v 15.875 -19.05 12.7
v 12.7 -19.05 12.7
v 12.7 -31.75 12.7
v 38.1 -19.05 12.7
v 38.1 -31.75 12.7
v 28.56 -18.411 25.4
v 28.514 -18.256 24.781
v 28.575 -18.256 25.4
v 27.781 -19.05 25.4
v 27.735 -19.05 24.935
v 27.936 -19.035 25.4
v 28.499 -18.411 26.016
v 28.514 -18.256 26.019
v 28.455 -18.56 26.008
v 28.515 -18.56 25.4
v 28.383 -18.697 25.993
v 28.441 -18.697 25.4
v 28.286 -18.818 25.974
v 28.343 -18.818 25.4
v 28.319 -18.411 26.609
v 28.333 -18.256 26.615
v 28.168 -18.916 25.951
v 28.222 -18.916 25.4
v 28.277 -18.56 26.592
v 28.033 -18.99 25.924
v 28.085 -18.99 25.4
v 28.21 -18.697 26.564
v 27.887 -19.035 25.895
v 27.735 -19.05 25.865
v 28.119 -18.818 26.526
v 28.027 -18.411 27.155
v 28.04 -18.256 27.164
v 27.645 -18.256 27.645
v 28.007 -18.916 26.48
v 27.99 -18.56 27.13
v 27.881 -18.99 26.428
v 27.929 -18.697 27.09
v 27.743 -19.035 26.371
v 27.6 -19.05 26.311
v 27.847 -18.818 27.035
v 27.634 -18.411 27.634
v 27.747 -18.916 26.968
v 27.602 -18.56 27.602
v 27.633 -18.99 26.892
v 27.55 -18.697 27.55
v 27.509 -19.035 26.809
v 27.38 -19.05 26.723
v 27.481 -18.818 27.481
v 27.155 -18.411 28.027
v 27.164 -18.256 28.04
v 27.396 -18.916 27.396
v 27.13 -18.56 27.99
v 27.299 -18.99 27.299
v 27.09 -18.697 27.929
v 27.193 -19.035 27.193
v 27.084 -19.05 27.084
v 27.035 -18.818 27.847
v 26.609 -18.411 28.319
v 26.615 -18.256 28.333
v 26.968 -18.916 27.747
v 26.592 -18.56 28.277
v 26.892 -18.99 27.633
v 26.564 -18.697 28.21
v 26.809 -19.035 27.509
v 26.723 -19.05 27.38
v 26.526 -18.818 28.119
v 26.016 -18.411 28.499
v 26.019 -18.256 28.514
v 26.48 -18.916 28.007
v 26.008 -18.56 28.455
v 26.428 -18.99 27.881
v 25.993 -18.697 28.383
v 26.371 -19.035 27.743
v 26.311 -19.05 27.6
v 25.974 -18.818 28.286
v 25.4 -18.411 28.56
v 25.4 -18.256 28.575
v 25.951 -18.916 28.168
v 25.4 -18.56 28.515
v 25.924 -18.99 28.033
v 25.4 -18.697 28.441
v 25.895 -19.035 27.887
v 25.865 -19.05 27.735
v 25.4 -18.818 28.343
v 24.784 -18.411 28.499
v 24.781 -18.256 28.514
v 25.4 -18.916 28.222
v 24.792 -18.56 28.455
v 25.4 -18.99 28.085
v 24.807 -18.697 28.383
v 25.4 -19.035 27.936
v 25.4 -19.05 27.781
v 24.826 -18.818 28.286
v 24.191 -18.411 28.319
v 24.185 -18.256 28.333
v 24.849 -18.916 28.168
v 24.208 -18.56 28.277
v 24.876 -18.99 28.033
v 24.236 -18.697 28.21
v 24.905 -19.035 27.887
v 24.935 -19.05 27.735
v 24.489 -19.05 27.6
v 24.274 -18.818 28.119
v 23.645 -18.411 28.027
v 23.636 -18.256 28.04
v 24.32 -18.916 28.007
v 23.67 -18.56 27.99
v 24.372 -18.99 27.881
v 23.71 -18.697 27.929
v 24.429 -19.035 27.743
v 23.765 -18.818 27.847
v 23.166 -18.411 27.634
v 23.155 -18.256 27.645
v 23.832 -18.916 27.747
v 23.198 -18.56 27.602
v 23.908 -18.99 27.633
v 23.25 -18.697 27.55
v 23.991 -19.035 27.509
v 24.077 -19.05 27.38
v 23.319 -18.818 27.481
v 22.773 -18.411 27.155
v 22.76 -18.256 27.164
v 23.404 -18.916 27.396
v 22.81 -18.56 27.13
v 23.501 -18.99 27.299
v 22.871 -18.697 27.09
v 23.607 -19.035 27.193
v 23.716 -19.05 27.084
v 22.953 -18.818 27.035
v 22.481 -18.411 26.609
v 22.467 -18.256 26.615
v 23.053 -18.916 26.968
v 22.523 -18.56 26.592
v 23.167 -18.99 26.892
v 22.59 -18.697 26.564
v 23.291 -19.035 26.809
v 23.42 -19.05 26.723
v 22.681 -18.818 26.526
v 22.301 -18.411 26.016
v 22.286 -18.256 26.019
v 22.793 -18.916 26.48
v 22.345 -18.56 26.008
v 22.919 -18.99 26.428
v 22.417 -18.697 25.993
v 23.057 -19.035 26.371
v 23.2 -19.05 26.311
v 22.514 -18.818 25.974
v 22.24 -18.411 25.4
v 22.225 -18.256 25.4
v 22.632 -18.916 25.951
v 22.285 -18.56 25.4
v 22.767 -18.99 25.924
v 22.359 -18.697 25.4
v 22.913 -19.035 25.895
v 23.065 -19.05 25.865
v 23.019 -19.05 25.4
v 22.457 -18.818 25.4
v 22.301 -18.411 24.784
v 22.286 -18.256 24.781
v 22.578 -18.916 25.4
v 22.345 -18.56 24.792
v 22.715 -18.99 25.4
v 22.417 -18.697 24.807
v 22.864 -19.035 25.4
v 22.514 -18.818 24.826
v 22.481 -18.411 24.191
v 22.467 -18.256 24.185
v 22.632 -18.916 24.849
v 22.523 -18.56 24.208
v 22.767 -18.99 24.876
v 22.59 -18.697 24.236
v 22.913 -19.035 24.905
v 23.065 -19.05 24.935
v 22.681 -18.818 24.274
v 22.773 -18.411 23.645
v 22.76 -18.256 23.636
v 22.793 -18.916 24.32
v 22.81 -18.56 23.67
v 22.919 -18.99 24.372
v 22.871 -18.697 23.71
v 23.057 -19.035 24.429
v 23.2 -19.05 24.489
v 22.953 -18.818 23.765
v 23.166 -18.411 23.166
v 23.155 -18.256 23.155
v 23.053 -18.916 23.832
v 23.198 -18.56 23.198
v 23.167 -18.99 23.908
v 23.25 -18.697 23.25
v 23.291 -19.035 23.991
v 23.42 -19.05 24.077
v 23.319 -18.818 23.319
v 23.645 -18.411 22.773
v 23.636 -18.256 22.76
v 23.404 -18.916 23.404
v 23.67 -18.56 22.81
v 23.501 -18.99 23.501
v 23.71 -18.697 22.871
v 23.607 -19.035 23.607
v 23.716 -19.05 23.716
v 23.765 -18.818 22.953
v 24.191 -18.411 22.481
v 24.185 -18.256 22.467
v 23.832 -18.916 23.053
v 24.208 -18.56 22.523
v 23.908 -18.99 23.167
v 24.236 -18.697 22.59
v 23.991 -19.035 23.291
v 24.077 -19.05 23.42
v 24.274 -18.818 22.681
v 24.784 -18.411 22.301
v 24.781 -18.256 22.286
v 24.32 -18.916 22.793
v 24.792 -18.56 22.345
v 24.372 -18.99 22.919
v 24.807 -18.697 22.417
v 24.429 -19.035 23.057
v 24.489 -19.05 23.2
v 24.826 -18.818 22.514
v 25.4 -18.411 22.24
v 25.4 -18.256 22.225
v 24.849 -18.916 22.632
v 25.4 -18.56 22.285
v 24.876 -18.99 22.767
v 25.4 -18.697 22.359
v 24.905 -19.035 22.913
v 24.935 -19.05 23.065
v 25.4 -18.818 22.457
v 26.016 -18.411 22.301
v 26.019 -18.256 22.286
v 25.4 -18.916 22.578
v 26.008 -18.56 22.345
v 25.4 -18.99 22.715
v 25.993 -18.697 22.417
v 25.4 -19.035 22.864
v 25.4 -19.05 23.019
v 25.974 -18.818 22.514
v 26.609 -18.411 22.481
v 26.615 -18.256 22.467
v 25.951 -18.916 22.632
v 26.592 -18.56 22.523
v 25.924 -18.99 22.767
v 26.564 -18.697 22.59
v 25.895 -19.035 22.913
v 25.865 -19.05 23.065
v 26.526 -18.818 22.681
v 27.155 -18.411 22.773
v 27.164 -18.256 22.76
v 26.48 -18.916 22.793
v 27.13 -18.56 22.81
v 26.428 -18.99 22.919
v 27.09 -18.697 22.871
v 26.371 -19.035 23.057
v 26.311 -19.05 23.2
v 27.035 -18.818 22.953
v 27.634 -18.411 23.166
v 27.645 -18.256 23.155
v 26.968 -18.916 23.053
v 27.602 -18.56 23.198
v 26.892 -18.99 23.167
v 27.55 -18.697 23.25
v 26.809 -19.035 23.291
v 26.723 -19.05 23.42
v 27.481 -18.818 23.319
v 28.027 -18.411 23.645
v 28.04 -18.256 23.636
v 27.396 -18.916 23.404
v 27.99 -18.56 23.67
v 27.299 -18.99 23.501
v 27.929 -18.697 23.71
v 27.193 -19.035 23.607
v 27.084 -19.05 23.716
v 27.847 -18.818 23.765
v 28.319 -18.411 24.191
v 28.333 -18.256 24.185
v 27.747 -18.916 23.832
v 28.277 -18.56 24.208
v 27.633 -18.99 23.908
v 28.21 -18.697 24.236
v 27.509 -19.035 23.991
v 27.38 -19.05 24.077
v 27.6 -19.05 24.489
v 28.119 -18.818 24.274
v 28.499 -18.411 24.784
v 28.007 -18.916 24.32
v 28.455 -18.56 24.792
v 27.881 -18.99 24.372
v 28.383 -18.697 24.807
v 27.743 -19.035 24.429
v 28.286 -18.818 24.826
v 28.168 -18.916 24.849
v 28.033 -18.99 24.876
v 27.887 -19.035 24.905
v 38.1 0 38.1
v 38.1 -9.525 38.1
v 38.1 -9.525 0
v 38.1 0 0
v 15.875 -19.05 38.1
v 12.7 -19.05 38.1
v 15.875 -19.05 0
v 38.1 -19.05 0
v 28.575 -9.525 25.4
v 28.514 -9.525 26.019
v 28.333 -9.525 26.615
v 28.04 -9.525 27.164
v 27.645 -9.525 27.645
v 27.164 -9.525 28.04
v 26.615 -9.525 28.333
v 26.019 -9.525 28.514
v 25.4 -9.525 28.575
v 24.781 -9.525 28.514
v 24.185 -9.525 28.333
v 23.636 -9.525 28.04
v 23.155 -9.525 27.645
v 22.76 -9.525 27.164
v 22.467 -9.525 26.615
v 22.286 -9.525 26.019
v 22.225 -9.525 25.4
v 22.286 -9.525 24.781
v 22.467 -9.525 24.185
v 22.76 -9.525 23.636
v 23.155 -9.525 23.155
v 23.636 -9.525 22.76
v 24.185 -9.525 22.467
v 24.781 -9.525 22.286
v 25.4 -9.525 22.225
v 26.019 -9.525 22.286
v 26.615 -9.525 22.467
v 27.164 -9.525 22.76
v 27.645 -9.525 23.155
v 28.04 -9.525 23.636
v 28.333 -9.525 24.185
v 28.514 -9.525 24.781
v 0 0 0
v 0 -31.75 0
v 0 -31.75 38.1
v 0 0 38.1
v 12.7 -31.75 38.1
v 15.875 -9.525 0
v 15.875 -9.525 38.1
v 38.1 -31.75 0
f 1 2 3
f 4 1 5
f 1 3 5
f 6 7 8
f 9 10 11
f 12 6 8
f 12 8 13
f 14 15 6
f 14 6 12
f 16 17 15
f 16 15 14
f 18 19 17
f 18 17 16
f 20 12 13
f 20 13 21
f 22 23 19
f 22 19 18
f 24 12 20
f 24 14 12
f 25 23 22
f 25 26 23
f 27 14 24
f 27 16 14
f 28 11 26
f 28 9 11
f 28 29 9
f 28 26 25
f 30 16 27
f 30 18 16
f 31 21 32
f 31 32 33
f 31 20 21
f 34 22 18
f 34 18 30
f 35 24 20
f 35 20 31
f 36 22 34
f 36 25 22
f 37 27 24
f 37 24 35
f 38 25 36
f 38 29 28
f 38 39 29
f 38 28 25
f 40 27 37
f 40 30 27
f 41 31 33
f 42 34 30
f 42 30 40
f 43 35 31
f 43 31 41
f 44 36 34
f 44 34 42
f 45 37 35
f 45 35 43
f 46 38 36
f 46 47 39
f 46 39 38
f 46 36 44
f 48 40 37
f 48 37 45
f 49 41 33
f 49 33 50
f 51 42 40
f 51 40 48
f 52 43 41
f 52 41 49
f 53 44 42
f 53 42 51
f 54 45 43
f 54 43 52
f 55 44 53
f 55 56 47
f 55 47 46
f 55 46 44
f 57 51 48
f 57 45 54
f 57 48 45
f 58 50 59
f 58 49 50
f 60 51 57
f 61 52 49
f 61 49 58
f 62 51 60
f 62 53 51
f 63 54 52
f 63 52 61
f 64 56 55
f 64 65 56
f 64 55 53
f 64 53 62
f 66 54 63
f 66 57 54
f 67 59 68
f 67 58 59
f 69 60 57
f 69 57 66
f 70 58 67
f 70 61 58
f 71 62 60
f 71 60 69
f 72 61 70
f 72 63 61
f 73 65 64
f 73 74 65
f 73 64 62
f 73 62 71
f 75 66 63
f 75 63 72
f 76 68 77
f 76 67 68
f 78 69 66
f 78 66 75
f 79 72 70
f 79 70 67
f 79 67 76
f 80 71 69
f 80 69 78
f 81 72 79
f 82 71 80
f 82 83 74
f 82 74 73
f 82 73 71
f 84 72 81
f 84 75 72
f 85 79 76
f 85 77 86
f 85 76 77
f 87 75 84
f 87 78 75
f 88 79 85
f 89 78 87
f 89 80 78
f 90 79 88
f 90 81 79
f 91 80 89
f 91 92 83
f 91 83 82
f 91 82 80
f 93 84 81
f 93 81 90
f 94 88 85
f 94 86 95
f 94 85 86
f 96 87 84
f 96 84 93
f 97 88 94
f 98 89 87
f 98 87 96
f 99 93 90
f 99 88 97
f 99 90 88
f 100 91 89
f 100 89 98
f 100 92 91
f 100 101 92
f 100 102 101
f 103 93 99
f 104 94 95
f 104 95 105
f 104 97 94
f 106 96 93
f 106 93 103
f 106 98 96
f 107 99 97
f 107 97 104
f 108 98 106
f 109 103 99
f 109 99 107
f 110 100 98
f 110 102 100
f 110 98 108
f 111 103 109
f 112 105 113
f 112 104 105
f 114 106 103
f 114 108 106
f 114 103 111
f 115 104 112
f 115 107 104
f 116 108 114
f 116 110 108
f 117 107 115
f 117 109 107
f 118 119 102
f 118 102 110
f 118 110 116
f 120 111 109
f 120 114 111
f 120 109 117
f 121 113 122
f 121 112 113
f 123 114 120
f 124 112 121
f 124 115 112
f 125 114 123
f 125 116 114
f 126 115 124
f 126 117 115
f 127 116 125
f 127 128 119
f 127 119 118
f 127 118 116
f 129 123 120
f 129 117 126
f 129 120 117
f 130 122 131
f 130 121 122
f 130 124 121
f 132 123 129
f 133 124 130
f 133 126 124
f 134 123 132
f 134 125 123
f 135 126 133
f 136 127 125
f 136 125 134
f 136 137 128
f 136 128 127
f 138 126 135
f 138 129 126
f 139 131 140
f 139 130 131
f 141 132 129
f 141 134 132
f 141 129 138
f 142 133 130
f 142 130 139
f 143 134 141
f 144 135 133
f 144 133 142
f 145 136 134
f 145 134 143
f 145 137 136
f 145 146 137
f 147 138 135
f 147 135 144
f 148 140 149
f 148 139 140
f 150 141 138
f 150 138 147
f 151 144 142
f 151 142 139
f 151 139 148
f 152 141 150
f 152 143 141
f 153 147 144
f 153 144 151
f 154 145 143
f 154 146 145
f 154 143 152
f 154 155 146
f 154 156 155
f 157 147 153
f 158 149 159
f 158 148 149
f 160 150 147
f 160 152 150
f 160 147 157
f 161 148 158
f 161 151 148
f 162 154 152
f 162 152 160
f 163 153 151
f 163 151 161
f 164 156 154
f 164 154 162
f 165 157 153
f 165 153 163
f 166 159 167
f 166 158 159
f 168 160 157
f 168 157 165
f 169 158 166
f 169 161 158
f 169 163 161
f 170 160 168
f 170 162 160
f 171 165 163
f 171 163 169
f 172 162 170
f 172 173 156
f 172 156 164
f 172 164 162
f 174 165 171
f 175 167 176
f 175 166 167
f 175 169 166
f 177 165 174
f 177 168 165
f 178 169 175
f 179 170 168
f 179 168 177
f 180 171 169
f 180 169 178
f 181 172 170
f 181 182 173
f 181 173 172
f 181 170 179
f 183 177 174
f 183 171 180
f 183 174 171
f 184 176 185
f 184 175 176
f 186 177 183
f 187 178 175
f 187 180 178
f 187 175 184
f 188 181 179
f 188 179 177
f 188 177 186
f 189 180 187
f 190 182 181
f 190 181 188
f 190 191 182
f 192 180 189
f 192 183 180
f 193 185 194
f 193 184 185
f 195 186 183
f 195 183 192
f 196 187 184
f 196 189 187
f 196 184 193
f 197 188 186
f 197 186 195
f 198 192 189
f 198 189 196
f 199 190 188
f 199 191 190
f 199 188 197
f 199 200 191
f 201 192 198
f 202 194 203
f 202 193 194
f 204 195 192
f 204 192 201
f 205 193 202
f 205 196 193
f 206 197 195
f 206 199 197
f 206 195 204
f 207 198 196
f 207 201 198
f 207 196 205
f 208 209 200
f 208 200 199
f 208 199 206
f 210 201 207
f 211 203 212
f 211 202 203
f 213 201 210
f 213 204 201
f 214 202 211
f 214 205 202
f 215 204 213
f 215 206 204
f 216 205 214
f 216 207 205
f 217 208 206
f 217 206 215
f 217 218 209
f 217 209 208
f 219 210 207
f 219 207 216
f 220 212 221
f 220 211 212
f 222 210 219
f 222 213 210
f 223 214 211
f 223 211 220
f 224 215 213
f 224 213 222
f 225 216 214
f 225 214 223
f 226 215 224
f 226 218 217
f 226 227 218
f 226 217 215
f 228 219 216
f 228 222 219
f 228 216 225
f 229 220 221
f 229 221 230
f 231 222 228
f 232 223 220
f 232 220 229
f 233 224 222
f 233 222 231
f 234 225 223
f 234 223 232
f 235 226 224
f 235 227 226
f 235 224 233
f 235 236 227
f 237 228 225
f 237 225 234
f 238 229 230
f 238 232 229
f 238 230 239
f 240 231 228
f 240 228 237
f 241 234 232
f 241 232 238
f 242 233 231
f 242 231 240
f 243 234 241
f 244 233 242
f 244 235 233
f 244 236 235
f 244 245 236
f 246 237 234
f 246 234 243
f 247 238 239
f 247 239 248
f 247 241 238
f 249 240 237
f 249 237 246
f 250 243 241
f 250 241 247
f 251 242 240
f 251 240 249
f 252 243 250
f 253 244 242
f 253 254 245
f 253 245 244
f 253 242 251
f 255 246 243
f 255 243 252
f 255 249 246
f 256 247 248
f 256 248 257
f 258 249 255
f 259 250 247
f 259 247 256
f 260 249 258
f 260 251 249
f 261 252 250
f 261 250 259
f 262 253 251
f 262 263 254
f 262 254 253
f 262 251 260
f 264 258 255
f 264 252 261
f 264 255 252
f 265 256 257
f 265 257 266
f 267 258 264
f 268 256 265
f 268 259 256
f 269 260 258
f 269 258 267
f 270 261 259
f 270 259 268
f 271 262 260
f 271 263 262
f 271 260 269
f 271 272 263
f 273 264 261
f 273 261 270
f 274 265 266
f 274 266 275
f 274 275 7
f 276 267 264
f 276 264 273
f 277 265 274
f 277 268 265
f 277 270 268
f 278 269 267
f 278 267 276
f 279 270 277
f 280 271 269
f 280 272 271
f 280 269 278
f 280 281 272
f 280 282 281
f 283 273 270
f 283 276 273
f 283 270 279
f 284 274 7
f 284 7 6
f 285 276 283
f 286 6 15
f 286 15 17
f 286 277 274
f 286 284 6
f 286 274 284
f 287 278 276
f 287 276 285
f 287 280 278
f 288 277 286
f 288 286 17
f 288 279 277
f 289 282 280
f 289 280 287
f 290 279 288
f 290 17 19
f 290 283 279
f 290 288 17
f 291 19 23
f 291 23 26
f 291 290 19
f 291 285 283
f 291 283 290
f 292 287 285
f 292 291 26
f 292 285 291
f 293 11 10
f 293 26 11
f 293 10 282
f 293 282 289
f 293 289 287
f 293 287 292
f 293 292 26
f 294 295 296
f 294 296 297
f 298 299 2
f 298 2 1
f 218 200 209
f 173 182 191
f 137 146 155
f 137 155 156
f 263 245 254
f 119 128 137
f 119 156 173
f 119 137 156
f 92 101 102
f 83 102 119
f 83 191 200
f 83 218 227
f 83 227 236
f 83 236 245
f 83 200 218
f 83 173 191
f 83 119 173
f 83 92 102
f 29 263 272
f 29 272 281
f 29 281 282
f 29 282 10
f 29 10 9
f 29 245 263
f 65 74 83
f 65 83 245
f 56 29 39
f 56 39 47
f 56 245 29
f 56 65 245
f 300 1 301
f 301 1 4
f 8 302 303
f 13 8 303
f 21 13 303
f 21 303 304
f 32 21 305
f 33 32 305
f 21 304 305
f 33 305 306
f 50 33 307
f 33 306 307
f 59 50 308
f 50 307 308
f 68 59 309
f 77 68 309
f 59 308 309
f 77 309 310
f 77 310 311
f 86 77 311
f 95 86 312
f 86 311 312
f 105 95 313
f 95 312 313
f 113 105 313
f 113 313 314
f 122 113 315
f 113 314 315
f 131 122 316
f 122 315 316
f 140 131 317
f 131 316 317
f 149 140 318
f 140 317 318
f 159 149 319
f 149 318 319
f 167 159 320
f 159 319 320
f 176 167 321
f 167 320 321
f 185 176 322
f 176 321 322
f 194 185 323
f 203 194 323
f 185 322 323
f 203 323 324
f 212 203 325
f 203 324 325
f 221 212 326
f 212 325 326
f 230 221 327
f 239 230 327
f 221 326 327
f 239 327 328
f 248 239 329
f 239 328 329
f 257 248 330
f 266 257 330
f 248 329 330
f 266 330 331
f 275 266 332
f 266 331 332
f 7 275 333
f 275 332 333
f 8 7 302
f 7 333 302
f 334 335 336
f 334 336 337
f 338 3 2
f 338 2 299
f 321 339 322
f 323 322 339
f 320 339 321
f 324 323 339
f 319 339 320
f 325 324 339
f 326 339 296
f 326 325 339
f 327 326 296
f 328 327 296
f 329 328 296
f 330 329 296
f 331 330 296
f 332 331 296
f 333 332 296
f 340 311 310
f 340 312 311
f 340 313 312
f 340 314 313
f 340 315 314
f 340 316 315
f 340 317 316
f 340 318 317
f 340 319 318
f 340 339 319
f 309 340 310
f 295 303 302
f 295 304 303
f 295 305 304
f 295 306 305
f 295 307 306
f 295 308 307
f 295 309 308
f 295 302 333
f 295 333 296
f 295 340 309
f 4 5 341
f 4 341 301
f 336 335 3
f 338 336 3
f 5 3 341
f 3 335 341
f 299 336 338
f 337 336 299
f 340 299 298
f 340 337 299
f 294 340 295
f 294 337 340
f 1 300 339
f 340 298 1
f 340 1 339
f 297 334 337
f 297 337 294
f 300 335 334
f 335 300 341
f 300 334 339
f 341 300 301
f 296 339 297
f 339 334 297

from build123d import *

# Parameters (mm, degrees)
F0_W     = 38.1
F0_H     = 31.75
F1_DEPTH = 38.1
F2_W     = 25.4
F2_H     = 25.4
F3_DEPTH = 12.7
F4_W     = 22.225
F4_H     = 9.525
F5_DEPTH = 38.101
F6_R     = 3.175
F7_DEPTH = 9.525
F8_R     = 0.79375


with BuildPart() as f1:
    # F0 (on Top) → F1 (new body)
    with BuildSketch(Plane.XY):
        with Locations((19.05, -15.875)):
            Rectangle(F0_W, F0_H)
    extrude(amount=F1_DEPTH)

    # F2 (on face) → F3 (cut)
    with BuildSketch(Plane.XZ.offset(31.75)):
        with Locations((25.4, 25.4)):
            Rectangle(F2_W, F2_H)
    extrude(amount=-F3_DEPTH, mode=Mode.SUBTRACT)

    # F4 (on face) → F5 (cut, through all)
    with BuildSketch(Plane.XY.offset(38.1)):
        with Locations((26.9875, -14.2875)):
            Rectangle(F4_W, F4_H)
    extrude(amount=-F5_DEPTH, mode=Mode.SUBTRACT)

    # F6 (on face) → F7 (join)
    with BuildSketch(Plane.XZ.offset(9.525)):
        with Locations((25.4, 25.4)):
            Circle(F6_R)
    extrude(amount=F7_DEPTH)

    # F8
    f8_edges = [f1.edges().sort_by_distance(p)[0] for p in [
        (22.225, -19.05, 25.4),
    ]]
    fillet(f8_edges, radius=F8_R)


solid = f1.part
